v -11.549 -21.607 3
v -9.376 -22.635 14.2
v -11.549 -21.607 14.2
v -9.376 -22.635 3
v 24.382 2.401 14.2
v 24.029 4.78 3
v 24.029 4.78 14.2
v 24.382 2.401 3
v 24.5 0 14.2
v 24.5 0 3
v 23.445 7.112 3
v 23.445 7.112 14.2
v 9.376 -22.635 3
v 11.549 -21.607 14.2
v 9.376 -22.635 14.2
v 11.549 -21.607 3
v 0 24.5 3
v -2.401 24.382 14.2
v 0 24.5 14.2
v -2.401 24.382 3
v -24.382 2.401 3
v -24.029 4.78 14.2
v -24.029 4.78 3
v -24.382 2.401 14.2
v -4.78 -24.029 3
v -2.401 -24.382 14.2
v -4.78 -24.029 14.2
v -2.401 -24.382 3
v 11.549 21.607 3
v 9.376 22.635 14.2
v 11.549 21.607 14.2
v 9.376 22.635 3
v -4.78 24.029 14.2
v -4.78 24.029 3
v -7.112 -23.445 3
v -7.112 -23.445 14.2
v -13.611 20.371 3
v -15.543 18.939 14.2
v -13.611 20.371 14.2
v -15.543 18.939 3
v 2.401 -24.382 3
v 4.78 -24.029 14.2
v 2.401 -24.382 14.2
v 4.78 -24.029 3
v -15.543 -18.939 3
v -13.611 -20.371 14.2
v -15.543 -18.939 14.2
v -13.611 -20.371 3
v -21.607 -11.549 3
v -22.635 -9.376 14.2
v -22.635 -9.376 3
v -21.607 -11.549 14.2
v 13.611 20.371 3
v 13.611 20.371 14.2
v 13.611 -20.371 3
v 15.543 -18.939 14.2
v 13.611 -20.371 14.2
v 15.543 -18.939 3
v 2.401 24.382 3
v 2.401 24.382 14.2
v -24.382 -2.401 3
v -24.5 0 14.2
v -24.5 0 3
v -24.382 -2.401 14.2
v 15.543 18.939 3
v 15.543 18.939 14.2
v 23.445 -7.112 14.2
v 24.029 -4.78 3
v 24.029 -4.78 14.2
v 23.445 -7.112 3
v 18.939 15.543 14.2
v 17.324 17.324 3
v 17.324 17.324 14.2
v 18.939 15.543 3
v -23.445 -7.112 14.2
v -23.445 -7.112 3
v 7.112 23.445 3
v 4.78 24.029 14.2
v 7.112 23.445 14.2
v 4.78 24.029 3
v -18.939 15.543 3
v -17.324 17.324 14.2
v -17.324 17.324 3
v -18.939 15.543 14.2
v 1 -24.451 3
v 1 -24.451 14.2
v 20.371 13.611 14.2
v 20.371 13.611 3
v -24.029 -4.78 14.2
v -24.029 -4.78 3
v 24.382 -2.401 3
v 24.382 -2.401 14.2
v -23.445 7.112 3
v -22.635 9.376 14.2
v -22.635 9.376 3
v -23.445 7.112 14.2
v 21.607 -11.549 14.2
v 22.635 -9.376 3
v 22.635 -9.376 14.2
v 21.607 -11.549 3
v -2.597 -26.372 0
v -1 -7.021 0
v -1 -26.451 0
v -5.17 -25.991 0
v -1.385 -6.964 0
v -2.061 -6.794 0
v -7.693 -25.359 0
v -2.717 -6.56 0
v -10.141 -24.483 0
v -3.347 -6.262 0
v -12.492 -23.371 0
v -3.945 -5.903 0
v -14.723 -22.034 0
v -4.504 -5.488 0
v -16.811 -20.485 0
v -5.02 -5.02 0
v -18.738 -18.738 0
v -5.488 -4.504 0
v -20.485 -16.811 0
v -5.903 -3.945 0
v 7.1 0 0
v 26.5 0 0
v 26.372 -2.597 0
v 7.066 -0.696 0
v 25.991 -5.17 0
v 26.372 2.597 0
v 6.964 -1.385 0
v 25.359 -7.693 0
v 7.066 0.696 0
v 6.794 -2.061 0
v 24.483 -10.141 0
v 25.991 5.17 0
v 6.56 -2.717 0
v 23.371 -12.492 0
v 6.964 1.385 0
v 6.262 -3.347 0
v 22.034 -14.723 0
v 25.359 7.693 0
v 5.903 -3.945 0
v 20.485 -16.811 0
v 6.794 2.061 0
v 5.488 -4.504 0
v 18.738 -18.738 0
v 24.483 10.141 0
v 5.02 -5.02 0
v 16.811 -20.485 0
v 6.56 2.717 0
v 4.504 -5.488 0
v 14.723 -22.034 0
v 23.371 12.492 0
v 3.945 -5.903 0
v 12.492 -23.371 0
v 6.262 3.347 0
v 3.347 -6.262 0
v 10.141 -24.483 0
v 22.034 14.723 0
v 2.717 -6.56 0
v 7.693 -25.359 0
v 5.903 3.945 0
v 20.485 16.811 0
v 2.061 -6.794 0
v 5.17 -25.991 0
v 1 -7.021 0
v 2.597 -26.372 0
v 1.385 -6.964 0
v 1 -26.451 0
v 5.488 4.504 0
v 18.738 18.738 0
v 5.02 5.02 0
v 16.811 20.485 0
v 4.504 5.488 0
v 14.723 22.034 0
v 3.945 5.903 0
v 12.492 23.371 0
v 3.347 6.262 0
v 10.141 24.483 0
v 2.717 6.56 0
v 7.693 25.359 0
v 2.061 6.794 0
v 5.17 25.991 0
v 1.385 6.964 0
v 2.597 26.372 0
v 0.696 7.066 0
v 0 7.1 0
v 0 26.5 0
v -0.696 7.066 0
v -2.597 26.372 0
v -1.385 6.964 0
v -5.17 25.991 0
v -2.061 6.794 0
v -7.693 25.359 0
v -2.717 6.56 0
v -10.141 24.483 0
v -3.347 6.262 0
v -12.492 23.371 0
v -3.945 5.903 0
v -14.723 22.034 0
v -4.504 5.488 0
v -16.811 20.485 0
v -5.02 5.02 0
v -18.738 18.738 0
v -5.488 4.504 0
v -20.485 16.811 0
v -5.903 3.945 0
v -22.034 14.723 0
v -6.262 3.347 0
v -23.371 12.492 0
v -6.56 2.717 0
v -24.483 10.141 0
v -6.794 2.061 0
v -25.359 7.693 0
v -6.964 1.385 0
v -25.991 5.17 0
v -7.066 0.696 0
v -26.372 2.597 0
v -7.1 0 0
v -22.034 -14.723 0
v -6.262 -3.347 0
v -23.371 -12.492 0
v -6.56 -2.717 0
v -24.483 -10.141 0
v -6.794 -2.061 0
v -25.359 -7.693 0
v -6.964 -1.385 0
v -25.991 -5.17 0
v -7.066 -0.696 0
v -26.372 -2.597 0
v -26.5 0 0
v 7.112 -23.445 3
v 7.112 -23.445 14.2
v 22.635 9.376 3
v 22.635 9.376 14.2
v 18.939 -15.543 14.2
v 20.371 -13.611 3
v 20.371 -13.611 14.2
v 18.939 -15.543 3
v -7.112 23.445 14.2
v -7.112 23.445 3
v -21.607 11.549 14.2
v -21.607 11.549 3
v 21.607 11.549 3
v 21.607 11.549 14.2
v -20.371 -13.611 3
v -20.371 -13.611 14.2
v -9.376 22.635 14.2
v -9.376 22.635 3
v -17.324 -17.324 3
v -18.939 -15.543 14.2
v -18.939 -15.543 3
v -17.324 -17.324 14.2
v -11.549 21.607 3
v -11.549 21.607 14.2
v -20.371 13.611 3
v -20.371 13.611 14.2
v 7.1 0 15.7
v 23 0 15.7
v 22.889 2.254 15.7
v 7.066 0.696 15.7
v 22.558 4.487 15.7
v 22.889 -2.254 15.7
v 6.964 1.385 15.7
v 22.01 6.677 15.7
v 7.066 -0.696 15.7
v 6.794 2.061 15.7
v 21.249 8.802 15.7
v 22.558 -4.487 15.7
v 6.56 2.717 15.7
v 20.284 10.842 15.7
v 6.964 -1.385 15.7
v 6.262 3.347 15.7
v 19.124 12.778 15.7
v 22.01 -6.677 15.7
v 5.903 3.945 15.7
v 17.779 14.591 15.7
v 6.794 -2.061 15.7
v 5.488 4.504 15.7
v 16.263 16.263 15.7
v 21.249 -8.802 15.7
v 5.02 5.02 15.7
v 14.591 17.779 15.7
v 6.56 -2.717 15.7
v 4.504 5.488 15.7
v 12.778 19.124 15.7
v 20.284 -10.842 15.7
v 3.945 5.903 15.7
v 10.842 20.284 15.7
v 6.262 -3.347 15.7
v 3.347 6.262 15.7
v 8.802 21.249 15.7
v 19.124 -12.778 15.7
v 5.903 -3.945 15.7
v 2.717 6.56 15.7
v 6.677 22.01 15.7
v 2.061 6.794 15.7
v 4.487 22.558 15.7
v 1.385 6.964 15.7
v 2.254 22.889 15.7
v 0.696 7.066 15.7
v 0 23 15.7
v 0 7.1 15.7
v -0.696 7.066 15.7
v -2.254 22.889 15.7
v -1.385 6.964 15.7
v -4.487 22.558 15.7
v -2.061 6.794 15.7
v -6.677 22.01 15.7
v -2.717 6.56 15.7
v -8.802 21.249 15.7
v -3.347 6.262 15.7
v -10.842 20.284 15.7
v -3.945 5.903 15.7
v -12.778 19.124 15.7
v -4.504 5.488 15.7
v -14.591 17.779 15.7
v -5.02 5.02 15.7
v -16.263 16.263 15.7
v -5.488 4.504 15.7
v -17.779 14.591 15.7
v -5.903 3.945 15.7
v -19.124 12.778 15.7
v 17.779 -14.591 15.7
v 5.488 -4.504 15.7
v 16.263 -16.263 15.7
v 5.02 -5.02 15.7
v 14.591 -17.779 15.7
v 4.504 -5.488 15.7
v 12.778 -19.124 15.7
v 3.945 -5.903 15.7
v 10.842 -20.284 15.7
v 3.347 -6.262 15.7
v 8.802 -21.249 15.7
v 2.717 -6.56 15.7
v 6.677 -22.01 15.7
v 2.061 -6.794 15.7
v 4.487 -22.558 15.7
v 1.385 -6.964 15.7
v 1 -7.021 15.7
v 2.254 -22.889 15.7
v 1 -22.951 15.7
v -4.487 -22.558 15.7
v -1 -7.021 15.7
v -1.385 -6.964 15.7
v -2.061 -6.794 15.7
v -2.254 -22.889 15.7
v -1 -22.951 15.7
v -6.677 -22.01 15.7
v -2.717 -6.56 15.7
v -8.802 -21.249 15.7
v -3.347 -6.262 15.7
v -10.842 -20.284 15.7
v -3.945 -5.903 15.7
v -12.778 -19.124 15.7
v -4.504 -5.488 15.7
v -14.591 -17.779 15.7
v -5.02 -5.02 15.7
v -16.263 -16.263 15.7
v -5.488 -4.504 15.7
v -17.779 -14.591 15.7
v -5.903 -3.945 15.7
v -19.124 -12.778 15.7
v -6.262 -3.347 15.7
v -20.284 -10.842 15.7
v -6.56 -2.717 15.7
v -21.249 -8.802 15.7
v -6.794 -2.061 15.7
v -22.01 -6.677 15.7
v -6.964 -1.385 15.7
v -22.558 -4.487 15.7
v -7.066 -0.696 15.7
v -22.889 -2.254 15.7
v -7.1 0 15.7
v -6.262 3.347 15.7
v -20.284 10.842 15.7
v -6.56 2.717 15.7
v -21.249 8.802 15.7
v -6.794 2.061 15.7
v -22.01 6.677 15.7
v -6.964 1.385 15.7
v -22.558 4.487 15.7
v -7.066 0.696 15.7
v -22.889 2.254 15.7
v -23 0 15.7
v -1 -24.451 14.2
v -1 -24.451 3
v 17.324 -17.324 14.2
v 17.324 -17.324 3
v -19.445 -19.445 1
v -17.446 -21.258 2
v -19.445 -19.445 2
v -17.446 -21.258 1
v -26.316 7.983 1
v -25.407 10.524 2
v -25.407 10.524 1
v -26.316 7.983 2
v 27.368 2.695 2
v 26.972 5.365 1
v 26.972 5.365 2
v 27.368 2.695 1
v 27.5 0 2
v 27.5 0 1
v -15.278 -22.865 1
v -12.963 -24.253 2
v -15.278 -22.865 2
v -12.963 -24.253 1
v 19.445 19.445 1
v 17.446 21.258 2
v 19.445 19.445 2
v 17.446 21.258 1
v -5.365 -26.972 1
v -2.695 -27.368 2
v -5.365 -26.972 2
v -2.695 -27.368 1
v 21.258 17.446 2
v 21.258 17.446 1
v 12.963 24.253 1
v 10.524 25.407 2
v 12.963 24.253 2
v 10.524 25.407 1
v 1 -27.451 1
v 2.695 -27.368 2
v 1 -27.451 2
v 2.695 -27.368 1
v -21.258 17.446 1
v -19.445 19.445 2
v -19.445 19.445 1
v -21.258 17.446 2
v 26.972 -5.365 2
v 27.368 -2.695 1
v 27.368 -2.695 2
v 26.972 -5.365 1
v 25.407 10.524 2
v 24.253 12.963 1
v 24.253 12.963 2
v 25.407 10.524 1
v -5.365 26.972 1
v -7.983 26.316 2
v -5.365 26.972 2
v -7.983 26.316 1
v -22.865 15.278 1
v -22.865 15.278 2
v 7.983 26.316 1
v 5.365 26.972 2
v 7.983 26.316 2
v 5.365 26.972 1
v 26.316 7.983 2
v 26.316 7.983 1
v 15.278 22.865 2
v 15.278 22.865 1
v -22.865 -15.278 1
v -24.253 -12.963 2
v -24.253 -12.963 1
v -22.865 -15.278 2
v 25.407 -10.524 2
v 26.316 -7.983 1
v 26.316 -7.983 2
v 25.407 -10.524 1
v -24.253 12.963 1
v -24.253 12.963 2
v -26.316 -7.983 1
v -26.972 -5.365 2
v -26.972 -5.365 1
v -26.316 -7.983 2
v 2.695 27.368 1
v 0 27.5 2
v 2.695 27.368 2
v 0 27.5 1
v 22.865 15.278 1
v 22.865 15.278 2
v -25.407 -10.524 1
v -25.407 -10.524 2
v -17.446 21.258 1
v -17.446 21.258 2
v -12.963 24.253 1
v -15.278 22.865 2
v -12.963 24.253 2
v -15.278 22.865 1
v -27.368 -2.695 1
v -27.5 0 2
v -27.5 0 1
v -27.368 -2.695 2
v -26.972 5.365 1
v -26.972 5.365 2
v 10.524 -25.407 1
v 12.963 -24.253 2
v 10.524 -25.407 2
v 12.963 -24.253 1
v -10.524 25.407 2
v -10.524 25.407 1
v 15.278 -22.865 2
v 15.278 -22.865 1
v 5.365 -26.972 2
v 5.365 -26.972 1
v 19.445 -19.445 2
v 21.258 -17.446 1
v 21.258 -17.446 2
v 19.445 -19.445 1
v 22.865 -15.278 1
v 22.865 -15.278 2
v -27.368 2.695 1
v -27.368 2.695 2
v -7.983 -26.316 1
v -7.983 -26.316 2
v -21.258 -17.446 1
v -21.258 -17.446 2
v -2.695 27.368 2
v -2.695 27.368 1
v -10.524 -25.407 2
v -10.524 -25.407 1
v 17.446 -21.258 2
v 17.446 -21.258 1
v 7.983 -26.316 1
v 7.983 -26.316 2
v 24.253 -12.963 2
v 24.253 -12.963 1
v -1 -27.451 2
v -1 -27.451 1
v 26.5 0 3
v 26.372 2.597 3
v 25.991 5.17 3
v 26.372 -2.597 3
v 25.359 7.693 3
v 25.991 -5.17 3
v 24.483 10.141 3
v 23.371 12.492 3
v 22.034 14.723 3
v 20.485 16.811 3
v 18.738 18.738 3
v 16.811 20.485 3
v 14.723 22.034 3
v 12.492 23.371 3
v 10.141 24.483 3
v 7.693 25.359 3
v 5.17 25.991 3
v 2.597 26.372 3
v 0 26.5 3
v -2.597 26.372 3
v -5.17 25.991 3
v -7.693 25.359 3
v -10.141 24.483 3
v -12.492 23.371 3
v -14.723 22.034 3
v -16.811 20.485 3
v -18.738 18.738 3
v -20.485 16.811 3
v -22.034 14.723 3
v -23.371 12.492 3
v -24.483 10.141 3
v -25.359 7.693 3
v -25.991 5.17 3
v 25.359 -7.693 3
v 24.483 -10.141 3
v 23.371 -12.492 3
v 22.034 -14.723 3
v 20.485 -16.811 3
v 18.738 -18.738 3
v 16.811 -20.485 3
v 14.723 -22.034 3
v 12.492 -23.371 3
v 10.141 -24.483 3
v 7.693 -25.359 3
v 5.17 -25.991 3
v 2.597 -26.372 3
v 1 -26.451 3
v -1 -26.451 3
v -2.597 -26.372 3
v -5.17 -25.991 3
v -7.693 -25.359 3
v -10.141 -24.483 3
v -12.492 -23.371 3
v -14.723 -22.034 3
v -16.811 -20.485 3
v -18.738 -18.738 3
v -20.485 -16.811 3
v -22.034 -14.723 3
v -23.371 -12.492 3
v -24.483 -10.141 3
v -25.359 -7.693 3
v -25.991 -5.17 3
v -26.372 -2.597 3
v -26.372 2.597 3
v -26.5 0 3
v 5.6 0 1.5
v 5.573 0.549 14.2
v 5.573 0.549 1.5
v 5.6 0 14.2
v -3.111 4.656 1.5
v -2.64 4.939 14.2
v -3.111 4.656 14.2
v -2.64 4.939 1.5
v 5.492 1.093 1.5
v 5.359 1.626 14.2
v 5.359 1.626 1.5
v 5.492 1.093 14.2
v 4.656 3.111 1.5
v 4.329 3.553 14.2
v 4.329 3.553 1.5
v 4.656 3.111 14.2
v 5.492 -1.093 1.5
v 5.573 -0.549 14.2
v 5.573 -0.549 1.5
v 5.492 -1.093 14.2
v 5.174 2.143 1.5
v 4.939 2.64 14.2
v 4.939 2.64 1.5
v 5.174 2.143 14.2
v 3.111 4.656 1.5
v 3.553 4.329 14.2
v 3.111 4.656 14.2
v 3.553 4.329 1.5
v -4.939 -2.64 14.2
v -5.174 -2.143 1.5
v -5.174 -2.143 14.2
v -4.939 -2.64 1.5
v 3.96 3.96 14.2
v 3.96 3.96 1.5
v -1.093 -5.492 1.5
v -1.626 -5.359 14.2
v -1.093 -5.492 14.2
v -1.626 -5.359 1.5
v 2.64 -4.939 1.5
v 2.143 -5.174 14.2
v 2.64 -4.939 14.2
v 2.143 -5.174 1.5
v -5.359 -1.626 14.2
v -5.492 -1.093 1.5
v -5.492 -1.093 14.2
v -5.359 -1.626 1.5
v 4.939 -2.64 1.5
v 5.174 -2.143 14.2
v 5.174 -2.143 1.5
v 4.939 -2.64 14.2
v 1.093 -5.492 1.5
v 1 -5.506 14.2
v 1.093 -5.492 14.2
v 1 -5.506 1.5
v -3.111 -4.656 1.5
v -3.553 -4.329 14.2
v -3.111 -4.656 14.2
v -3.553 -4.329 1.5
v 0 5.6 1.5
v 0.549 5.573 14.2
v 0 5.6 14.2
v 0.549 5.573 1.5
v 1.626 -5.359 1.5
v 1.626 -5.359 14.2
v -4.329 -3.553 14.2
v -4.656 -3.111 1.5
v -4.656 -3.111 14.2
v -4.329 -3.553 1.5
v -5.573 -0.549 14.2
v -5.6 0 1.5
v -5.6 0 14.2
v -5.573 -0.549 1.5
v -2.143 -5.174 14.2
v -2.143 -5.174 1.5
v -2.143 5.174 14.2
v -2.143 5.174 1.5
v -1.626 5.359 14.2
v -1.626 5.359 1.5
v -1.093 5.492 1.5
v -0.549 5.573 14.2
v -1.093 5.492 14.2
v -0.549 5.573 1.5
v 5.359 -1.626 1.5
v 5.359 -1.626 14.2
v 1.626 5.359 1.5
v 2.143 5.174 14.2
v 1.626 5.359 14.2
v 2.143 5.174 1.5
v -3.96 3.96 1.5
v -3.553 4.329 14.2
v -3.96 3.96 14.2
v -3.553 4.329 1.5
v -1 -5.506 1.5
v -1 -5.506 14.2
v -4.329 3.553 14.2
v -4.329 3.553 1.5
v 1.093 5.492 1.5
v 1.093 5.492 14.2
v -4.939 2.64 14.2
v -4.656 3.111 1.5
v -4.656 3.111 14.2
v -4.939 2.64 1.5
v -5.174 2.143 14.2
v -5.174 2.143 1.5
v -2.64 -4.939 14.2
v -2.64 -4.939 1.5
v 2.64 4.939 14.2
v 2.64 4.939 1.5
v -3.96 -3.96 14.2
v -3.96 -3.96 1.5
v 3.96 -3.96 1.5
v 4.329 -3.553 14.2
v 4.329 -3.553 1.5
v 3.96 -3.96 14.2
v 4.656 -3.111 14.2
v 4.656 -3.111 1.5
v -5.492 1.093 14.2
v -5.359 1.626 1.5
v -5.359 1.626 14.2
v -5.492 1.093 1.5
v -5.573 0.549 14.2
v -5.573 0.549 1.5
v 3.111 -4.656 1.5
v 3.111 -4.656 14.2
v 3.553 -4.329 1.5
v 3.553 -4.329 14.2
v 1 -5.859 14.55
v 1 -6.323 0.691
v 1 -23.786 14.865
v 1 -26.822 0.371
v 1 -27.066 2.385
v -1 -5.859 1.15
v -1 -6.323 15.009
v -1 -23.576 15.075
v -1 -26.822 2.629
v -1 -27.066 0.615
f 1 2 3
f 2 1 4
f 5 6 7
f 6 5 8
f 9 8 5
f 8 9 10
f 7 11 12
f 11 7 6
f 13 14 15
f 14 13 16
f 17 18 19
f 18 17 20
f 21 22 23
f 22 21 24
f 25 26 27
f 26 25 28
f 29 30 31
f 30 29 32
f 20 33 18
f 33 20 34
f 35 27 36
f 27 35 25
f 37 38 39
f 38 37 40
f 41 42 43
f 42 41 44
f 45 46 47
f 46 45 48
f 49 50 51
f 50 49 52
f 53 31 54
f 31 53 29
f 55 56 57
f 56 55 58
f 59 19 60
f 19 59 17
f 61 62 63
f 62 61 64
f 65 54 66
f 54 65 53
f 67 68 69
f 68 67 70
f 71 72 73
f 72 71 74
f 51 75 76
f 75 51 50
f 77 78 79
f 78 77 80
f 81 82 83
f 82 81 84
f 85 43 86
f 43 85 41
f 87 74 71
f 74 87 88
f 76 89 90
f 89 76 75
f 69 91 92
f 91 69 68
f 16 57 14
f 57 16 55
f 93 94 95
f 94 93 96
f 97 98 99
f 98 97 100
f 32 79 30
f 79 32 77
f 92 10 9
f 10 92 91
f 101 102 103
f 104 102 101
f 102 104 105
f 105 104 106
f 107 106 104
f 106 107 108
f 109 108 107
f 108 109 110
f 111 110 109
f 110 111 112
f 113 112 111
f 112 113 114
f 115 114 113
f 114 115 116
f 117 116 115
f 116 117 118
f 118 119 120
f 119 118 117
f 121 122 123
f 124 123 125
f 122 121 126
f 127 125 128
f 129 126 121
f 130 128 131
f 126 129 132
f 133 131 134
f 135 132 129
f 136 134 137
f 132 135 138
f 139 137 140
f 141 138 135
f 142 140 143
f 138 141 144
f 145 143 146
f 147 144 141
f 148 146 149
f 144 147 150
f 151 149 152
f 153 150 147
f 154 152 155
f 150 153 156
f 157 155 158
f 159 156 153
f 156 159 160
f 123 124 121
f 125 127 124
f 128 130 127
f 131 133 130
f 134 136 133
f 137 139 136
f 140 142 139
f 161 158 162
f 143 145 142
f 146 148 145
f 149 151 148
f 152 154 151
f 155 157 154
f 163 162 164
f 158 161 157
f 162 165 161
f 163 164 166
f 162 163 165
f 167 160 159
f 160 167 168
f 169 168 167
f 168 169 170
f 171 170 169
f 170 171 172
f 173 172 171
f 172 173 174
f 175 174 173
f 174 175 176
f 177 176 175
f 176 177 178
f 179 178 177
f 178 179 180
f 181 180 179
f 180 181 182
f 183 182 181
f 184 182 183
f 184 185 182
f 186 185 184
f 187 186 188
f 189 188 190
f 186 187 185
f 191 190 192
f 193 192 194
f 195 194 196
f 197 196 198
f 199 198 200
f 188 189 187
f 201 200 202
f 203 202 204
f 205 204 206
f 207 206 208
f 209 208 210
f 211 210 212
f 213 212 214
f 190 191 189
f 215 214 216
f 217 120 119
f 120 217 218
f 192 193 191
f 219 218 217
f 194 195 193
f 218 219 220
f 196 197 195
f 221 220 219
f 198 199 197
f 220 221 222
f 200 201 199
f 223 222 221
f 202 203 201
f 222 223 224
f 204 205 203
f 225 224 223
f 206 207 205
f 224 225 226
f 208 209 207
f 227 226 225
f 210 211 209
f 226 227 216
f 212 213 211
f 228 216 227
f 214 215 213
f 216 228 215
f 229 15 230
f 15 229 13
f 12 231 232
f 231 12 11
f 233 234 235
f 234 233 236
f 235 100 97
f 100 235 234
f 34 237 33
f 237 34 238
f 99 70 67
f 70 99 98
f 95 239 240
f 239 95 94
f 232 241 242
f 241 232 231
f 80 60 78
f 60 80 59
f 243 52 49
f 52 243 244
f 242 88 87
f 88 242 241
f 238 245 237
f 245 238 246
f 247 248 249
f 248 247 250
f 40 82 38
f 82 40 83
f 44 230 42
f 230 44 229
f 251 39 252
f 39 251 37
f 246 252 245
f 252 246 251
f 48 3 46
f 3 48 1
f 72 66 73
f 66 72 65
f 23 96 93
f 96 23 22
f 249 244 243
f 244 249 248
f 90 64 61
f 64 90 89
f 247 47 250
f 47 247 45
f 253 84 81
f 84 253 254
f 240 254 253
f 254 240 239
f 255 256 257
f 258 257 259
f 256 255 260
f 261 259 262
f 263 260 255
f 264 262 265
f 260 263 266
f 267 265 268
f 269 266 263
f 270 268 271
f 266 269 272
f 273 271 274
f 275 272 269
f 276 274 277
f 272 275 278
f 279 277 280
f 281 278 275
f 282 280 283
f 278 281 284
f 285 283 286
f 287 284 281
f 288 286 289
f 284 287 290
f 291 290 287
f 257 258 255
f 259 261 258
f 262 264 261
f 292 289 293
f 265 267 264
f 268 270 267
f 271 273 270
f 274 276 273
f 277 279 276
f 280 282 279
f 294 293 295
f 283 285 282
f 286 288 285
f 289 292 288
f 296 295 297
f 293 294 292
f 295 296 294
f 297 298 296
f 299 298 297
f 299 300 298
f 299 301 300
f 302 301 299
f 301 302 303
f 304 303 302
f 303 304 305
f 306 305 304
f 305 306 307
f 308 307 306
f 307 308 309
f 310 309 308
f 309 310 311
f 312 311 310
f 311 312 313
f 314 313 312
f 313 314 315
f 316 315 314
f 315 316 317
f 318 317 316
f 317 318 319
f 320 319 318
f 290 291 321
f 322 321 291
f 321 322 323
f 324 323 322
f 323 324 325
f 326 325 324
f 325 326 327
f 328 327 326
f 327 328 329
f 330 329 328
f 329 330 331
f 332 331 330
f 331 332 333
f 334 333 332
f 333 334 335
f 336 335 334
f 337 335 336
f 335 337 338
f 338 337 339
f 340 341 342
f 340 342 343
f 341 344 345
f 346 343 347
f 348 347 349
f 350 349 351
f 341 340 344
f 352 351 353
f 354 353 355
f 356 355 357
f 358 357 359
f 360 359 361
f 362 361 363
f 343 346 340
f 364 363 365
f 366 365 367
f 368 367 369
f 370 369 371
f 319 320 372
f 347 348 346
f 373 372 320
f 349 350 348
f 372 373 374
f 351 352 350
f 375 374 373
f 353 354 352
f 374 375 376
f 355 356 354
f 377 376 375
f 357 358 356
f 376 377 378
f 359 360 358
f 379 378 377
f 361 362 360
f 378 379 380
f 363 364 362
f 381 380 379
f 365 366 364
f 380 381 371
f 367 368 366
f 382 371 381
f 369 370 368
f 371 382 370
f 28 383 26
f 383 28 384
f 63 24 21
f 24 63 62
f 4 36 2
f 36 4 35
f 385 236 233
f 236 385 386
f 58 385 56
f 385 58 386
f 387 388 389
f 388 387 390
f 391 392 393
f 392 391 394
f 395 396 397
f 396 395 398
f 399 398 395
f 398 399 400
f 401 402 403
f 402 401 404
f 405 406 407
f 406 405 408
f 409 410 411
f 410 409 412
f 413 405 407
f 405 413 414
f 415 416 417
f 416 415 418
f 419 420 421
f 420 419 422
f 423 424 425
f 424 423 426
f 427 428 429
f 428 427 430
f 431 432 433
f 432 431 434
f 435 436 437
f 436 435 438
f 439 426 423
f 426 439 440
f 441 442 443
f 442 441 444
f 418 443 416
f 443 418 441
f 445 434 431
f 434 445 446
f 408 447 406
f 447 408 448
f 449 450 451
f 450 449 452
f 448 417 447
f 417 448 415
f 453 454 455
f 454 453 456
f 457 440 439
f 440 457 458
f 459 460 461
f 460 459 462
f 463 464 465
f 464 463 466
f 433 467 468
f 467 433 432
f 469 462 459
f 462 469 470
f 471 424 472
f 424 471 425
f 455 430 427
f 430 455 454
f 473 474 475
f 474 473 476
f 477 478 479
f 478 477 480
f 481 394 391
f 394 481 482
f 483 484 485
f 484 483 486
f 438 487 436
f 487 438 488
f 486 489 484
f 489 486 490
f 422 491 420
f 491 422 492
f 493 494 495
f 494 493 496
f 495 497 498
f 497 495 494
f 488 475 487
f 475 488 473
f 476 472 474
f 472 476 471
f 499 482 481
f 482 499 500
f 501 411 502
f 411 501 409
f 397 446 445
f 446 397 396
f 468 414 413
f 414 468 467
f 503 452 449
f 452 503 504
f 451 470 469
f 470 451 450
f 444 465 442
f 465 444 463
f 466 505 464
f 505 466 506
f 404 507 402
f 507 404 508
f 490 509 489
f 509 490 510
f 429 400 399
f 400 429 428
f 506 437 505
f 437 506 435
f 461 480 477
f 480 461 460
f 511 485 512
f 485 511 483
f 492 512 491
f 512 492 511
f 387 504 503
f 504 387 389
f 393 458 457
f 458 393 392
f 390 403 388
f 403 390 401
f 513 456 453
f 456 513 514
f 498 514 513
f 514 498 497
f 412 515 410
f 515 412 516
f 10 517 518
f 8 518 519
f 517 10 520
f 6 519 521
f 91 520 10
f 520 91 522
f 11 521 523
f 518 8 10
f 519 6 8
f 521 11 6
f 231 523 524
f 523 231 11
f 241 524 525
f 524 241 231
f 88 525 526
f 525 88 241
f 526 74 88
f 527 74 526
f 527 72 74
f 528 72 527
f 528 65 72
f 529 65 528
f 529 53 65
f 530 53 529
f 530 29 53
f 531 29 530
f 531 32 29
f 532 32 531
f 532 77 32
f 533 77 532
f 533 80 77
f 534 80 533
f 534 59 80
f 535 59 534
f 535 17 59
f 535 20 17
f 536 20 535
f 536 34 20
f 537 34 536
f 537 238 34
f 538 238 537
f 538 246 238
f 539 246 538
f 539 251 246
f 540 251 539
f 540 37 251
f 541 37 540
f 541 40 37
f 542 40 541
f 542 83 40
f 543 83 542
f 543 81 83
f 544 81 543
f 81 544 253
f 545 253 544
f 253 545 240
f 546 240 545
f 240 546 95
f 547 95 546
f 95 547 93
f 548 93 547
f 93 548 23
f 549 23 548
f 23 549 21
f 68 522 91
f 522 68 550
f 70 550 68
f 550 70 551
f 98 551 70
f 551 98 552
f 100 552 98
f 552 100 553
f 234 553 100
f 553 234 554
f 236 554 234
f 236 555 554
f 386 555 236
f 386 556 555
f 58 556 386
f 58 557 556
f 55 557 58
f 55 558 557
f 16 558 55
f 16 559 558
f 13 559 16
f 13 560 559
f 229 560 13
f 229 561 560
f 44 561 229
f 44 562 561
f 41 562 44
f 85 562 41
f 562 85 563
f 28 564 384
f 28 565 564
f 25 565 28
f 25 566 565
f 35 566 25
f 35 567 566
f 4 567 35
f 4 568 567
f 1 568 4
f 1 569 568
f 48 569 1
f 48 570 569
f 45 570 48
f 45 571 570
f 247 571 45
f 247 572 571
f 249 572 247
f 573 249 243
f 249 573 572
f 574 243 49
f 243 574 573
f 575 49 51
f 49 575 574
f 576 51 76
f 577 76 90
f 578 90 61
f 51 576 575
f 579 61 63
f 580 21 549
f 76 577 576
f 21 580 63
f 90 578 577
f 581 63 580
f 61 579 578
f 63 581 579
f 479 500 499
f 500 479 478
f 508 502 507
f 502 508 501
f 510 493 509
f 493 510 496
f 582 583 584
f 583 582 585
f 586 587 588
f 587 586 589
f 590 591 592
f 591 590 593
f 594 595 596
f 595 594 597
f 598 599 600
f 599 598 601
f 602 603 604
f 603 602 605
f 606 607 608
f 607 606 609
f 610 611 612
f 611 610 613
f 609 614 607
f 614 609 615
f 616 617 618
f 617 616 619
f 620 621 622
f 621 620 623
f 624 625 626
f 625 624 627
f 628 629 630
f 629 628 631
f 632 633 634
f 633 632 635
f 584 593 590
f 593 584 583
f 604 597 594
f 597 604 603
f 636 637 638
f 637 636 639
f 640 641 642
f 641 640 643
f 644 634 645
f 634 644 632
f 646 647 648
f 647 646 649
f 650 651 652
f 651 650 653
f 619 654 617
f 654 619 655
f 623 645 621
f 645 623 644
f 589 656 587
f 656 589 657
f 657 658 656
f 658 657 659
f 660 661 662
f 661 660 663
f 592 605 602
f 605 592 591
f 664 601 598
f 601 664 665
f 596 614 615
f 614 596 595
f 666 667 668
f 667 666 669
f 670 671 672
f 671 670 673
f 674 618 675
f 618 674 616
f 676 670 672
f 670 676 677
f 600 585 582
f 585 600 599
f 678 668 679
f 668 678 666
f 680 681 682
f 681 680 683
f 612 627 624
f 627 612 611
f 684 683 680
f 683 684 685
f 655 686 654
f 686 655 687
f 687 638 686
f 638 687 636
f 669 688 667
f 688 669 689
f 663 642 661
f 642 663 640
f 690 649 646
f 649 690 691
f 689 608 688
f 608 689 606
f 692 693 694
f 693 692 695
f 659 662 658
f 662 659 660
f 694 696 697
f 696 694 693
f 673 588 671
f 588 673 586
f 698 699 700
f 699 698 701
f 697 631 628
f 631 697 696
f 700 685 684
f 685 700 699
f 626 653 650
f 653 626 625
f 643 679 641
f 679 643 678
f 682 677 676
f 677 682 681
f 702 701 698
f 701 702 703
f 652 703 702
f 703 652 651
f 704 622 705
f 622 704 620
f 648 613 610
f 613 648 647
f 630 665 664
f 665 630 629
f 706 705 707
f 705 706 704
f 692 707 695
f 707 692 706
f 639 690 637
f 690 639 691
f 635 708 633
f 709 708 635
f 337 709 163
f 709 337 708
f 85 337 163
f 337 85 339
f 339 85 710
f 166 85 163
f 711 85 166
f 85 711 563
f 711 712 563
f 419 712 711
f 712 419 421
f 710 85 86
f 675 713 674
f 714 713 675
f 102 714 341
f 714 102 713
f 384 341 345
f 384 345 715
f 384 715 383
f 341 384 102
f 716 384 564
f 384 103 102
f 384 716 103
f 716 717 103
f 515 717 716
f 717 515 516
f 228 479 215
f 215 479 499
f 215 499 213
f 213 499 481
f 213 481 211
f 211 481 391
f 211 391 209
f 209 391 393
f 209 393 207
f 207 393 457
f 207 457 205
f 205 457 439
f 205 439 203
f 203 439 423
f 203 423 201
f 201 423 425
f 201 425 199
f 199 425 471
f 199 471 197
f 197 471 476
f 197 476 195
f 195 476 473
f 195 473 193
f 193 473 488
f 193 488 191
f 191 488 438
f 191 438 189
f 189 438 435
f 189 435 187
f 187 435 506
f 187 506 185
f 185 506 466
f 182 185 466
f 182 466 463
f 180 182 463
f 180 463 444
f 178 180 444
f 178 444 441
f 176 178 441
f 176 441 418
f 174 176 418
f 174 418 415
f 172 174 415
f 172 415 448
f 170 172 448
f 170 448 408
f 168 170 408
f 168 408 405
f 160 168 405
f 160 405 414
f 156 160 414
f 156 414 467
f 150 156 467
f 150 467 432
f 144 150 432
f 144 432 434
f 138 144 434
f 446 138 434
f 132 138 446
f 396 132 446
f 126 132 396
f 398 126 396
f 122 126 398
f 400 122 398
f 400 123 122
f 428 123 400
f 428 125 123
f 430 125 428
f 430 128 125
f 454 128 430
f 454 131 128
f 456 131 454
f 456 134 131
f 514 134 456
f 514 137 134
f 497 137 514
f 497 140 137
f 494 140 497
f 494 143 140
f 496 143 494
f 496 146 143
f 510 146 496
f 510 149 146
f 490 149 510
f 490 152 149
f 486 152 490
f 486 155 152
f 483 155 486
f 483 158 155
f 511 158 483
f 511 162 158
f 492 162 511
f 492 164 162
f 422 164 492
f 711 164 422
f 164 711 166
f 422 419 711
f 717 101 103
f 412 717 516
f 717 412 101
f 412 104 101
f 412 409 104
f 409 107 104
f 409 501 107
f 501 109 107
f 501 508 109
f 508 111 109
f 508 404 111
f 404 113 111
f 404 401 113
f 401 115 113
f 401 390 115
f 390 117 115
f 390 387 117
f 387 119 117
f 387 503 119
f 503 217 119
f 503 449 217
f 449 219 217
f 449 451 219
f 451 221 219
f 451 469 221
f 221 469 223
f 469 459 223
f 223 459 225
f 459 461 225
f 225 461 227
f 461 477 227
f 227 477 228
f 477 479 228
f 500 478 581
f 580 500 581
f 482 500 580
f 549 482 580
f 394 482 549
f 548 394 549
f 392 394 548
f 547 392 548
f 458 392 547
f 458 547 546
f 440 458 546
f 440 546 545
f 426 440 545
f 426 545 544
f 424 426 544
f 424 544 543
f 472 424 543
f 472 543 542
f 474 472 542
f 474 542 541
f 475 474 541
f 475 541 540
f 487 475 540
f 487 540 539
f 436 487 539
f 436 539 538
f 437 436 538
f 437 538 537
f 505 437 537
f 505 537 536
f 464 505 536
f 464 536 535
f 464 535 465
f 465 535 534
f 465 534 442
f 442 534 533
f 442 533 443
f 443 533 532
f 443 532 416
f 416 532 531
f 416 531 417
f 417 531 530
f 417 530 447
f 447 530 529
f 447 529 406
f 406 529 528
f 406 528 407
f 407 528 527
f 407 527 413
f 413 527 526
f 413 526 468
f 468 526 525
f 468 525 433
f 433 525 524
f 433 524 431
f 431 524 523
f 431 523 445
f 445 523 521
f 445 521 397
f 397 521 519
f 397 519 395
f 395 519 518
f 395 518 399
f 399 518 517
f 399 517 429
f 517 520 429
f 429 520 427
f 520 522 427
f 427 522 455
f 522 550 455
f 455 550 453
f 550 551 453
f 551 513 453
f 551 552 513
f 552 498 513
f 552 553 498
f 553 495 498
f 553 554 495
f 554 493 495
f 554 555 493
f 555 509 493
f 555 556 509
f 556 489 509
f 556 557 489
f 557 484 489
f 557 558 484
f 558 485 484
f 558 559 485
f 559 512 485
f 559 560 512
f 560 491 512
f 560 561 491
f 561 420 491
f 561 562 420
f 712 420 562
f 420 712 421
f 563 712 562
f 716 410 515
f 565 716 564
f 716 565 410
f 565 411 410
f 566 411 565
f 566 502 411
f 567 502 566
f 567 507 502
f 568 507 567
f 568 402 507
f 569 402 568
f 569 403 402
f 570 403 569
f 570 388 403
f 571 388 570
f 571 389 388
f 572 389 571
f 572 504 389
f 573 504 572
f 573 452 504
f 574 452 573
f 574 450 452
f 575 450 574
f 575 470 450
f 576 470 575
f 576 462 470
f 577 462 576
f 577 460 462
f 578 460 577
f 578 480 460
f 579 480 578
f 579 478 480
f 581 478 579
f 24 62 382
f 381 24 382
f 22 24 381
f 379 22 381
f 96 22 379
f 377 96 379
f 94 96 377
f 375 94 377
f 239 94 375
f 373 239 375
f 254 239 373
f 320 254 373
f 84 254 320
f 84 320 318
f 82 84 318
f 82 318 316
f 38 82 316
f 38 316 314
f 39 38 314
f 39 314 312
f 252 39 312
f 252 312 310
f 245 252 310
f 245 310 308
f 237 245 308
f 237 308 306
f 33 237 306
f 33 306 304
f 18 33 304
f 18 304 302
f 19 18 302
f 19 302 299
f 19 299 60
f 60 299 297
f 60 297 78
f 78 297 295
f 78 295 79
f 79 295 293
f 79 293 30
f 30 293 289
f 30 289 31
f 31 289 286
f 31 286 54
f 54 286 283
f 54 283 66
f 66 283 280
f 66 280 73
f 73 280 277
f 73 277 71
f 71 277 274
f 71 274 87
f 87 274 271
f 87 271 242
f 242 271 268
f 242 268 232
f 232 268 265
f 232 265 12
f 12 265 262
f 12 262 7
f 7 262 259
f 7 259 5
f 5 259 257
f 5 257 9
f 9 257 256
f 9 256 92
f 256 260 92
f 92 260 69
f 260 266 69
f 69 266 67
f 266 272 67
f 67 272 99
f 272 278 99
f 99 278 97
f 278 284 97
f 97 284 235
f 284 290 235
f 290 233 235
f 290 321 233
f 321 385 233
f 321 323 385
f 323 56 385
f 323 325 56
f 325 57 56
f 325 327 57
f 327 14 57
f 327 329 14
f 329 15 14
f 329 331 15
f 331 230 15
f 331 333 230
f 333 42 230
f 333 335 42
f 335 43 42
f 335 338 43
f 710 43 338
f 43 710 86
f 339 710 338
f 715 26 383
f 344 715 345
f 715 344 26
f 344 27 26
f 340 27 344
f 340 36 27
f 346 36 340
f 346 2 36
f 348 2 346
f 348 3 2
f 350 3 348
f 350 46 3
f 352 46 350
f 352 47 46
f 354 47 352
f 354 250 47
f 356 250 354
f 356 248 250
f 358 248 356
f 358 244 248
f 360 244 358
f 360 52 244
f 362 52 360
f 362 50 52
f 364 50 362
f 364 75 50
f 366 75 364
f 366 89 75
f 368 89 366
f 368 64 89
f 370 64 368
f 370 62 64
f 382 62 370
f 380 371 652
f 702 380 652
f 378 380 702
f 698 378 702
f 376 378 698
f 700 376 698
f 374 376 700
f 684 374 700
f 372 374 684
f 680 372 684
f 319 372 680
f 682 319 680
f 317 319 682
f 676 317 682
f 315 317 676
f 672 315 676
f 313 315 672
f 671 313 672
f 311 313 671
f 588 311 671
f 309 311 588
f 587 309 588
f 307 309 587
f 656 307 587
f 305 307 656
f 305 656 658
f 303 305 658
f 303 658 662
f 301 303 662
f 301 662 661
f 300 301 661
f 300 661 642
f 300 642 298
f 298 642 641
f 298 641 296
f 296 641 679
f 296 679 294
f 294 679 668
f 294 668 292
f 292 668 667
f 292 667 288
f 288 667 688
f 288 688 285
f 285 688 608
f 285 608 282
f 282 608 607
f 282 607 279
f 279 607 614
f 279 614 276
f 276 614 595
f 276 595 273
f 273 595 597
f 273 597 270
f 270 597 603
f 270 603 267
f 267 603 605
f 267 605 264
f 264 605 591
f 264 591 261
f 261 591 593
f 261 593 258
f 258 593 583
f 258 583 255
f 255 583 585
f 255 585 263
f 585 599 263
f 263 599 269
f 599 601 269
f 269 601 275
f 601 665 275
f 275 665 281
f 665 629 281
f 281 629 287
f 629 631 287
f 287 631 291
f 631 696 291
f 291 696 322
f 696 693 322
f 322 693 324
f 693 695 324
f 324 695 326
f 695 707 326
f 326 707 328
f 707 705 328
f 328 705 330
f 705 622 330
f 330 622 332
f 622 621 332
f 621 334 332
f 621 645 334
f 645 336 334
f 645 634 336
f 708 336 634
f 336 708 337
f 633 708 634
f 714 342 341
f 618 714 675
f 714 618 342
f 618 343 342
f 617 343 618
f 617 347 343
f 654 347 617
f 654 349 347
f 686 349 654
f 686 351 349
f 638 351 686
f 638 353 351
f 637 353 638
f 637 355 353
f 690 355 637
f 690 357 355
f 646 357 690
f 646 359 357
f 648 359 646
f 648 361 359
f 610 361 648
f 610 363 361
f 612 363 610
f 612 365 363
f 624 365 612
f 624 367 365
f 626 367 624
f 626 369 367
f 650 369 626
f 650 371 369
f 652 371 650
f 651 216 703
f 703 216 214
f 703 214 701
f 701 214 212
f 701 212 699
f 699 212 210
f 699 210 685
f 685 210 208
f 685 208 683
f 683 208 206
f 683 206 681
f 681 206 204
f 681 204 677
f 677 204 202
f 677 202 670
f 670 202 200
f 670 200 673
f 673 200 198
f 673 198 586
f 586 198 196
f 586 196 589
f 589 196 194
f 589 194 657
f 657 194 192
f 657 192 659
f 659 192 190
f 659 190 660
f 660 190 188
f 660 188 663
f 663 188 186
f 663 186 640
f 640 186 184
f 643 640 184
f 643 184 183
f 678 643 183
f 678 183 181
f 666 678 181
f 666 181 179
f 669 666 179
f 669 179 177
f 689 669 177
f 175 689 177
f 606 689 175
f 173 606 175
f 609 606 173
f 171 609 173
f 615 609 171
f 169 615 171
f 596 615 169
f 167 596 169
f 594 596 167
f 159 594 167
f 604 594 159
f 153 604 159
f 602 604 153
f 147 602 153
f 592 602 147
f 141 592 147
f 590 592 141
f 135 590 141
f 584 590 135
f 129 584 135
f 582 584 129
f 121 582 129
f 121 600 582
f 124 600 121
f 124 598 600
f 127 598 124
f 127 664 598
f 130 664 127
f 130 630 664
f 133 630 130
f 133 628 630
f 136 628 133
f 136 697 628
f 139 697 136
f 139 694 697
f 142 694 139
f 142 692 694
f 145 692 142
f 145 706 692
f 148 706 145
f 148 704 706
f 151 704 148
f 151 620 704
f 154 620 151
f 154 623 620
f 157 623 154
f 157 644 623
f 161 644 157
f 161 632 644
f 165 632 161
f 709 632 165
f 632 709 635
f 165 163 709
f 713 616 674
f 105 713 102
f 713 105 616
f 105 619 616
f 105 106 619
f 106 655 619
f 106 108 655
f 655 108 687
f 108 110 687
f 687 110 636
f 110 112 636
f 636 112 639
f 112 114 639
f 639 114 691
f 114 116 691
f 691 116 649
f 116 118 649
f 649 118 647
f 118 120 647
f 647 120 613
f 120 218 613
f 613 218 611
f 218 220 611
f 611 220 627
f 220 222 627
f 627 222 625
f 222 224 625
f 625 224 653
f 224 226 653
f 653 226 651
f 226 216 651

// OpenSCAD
//Parametric Adapter Tool Holder
//I made this to fit a sharpie in my Master Grip tool holder
//8/24/2015 By: David Bunch
//
//CUSTOMIZER VARIABLES

//1. Diameter of Inserted Adapter
OD = 49.0;

//2. Diameter of opening for smaller tool
ID = 11.2;          //This was a nice somewhat loose fit of a Sharpie Fine Point
                    //10.0 is about the diameter of a Sharpie Ultra Fine Point

//3. Diameter of Lip
LipThk = 3;

//4. Height of Lip
LipHt = 3;

//5. Height of Adapter Portion
Ht = 12.7;

//6. Resolution of Cylinder
I_Res = 64;

//CUSTOMIZER VARIABLES END

TotHt = Ht + LipHt;

LipOD = OD + LipThk + LipThk;
$fn = I_Res;

LipRad = LipOD / 2;

Rad = OD / 2;

RadID = ID / 2;
module DrawUnion()
{
    union()
    {
        cylinder(d=OD,h=TotHt);
        cylinder(d=LipOD,h=LipHt);
    }
}
difference()
{
    DrawUnion();
    translate([0,0,-1])
    cylinder(d=ID,h=TotHt+2);
    translate([-1,-32,-1])
    cube([2,32,TotHt+2]);
//Chamfer the outer bottom lip
    translate([0,0,0])
    rotate_extrude(convexity = 10, $fn = I_Res)
    translate([LipRad, 0, 0])
    circle(r = 1, $fn = 4);
//Chamfer the outer bottom lip
    translate([0,0,3])
    rotate_extrude(convexity = 10, $fn = I_Res)
    translate([LipRad, 0, 0])
    circle(r = 1, $fn = 4);
//Chamfer the outer top edge
    translate([0,0,TotHt])
    rotate_extrude(convexity = 10, $fn = I_Res)
    translate([Rad, 0, 0])
    circle(r = 1.5, $fn = 4);
//Chamfer the top of Tool Adapter
    translate([0,0,TotHt])
    rotate_extrude(convexity = 10, $fn = I_Res)
    translate([RadID, 0, 0])
    circle(r = 1.5, $fn = 4);
//Chamfer the bottom of Tool Adapter
    translate([0,0,0])
    rotate_extrude(convexity = 10, $fn = I_Res)
    translate([RadID, 0, 0])
    circle(r = 1.5, $fn = 4);
}
